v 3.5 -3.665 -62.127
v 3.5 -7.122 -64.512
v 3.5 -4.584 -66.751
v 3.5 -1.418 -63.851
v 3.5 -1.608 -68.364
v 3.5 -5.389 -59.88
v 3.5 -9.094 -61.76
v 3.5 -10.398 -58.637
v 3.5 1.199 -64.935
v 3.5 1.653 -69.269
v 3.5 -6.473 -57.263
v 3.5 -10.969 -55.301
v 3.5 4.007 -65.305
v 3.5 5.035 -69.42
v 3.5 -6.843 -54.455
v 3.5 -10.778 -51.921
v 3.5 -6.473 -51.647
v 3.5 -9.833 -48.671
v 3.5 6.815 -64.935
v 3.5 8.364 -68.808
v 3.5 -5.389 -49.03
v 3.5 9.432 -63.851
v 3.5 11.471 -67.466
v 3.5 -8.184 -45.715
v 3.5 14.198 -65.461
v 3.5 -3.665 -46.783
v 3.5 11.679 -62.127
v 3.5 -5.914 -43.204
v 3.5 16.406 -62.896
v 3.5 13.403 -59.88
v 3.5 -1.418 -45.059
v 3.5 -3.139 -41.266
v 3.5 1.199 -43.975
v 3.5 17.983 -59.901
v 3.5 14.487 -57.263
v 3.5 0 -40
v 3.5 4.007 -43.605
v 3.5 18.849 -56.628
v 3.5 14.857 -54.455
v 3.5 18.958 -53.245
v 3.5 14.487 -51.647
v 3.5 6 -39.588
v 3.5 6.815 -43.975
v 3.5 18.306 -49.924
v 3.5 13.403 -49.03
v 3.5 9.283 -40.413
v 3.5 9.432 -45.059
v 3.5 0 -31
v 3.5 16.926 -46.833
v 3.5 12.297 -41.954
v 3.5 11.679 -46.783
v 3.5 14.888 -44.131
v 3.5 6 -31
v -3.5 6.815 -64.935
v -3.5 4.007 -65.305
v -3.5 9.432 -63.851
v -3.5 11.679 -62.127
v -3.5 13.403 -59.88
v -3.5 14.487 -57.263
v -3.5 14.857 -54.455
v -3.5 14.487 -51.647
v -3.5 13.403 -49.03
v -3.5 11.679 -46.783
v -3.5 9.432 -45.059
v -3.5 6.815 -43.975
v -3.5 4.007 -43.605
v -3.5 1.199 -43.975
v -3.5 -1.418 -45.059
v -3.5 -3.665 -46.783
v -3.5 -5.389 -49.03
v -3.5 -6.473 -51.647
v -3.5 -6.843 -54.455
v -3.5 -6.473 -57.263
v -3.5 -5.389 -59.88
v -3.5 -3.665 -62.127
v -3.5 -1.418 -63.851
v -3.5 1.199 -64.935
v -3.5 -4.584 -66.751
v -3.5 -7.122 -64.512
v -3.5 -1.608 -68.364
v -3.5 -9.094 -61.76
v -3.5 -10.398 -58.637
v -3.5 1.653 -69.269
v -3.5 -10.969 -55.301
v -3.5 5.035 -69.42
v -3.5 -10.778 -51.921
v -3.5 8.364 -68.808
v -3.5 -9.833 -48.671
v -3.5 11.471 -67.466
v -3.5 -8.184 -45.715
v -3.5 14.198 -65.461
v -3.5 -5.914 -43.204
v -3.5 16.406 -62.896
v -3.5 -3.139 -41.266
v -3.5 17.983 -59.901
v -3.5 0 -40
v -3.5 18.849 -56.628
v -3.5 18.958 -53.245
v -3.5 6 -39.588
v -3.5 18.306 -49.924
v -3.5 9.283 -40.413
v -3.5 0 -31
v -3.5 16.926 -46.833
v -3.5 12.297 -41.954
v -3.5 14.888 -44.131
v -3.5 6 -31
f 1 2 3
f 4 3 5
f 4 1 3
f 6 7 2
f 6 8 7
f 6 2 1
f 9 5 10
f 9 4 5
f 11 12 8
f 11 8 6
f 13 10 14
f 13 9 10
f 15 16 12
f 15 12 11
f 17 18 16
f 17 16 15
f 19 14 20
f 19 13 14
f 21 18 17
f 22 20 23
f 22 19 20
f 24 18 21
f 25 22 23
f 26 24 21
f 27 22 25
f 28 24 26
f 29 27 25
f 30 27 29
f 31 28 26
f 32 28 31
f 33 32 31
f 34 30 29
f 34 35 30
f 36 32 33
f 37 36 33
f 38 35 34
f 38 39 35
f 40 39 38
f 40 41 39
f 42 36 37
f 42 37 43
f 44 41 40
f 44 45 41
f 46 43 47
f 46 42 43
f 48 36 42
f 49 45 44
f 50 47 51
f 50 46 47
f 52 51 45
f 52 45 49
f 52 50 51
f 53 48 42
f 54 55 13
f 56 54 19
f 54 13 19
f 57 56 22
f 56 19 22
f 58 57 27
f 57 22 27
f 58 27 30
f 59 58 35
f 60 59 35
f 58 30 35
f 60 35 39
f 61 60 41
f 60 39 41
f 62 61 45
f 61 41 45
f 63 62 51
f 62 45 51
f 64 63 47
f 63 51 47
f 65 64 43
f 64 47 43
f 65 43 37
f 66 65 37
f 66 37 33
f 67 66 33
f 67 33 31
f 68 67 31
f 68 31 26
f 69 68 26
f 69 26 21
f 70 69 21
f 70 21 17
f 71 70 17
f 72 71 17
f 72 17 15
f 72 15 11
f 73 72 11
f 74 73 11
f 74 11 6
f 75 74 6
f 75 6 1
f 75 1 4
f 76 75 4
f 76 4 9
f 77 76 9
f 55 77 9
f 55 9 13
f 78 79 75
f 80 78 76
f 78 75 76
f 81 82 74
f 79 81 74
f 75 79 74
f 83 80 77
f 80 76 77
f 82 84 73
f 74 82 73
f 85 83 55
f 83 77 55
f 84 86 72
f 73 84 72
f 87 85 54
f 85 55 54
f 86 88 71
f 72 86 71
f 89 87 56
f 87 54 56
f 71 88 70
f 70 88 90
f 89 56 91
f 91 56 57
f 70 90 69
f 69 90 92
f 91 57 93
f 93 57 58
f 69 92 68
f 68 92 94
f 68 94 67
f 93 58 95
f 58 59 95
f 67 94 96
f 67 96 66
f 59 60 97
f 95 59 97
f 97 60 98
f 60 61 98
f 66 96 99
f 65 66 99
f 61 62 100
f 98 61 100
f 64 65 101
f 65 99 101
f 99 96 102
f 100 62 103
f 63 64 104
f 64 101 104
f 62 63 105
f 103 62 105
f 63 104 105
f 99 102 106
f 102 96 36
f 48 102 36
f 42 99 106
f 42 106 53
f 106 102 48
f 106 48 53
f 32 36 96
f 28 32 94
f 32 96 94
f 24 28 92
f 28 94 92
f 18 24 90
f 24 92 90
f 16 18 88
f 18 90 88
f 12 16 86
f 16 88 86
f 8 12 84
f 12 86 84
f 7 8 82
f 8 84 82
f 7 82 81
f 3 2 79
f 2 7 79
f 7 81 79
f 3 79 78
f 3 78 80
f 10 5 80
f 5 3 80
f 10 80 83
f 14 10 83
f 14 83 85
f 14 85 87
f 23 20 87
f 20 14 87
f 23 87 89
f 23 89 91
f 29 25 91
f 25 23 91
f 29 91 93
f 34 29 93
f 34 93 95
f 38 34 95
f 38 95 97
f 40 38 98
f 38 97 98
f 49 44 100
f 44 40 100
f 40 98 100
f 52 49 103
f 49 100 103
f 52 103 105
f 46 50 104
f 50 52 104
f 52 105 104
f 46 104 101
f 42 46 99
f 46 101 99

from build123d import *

# Parameters (mm, degrees)
BOSS_EXTRUDE1_DEPTH      = 6
SKETCH2_R                = 5
CUT_EXTRUDE1_DEPTH       = 107
BOSS_EXTRUDE2_DEPTH      = 3.5
BOSS_EXTRUDE2_DEPTH_BACK = 3.5
SKETCH3_R                = 15
SKETCH4_R                = 10.85
CUT_EXTRUDE2_DEPTH       = 19.5
CIRPATTERN1_COUNT        = 3
SKETCH6_R                = 5
BOSS_EXTRUDE3_DEPTH      = 34
CUT_EXTRUDE5_DEPTH       = 103.68939394
CUT_EXTRUDE5_DEPTH_BACK  = 103.68939394
SKETCH12_W               = 81.781179221
SKETCH12_H               = 82.49231991
CUT_EXTRUDE6_DEPTH       = 39.848263365
CUT_EXTRUDE6_DEPTH_BACK  = 39.848263365
SKETCH13_W               = 17.873677222
SKETCH13_H               = 13.388121455
SKETCH13_W_2             = 15.899401816
SKETCH13_H_2             = 11.800117324


with BuildPart() as part:
    # Sketch1 → Boss-Extrude1 (new body)
    with BuildSketch(Plane(origin=(0, 0, 0), x_dir=(1, 0, 0), z_dir=(0, 1, 0))):
        Polygon((-11.547005384, 40), (-40.414518843, -10), (-28.867513459, -30), (28.867513459, -30), (40.414518843, -10), (11.547005384, 40), align=None)
    extrude(amount=BOSS_EXTRUDE1_DEPTH)

    # Sketch2 → Cut-Extrude1 (cut)
    with BuildSketch(Plane(origin=(0, 6, 0), x_dir=(1, 0, 0), z_dir=(0, 1, 0))):
        Circle(SKETCH2_R)
    extrude(amount=-CUT_EXTRUDE1_DEPTH, mode=Mode.SUBTRACT)

    # Sketch3 → Boss-Extrude2 (add, two sides: drawn at the far end of the back side and taken through both)
    with BuildSketch(Plane(origin=(0, 0, 0), x_dir=(0, 0, -1), z_dir=(1, 0, 0)).offset(-BOSS_EXTRUDE2_DEPTH_BACK)):
        with Locations((54.454926612, 4.00688116)):
            Circle(SKETCH3_R)
    extrude(amount=BOSS_EXTRUDE2_DEPTH + BOSS_EXTRUDE2_DEPTH_BACK)

    # Sketch4 → Cut-Extrude2 (cut)
    with BuildSketch(Plane(origin=(3.5, 0, 0), x_dir=(0, 0, -1), z_dir=(1, 0, 0))):
        with Locations((54.454926612, 4.00688116)):
            Circle(SKETCH4_R)
    extrude(amount=-CUT_EXTRUDE2_DEPTH, mode=Mode.SUBTRACT)


with BuildPart() as cirpattern1_1:
    # CirPattern1: pattern copy
    add(part.part.rotate(Axis((0, -101, 0), (0, 1, 0)), 1 * 360 / CIRPATTERN1_COUNT))


with BuildPart() as cirpattern1_2:
    # CirPattern1: pattern copy
    add(part.part.rotate(Axis((0, -101, 0), (0, 1, 0)), 2 * 360 / CIRPATTERN1_COUNT))


with BuildPart() as part_1:
    add(part.part)

    add(cirpattern1_1.part)  # Boss-Extrude3 merges CirPattern1_1

    add(cirpattern1_2.part)  # Boss-Extrude3 merges CirPattern1_2
    # Sketch6 → Boss-Extrude3 (add)
    with BuildSketch(Plane(origin=(0, 6, 0), x_dir=(1, 0, 0), z_dir=(0, 1, 0))):
        Circle(SKETCH6_R)
    extrude(amount=-BOSS_EXTRUDE3_DEPTH)


with BuildPart() as body_2:
    # Sketch8 → Revolve1 (revolve)
    with BuildSketch(Plane(origin=(0, -28, 0), x_dir=(-1, 0, 0), z_dir=(0, -1, 0))):
        with BuildLine():
            Line((0, 10), (0, -10))
            ThreePointArc((0, -10), (10, 0), (0, 10))
        make_face()
    revolve(axis=Axis((0, -28, 0), (0, 0, -1)))


with BuildPart() as cut_extrude5_tool:
    # Sketch12 → Cut-Extrude5 (new, two sides: drawn at the far end of the back side and taken through both)
    with BuildSketch(Plane(origin=(3.5, 0, 0), x_dir=(0, 0, -1), z_dir=(1, 0, 0)).offset(-CUT_EXTRUDE5_DEPTH_BACK)):
        with Locations((-9.89058961, -10.029914937)):
            Rectangle(SKETCH12_W, SKETCH12_H)
    extrude(amount=CUT_EXTRUDE5_DEPTH + CUT_EXTRUDE5_DEPTH_BACK)


with BuildPart() as part_2:
    add(part_1.part)

    # Cut-Extrude5: cut by cut_extrude5_tool
    add(cut_extrude5_tool.part, mode=Mode.SUBTRACT)

    # Sketch13 → Cut-Extrude6 (cut, two sides: drawn at the far end of the back side and taken through both)
    with BuildSketch(Plane(origin=(0, 0, -40), x_dir=(-1, 0, 0), z_dir=(0, 0, -1)).offset(-CUT_EXTRUDE6_DEPTH_BACK)):
        with Locations((12.436838611, -0.694060728)):
            Rectangle(SKETCH13_W, SKETCH13_H)
        with Locations((-11.449700908, 0.099941338)):
            Rectangle(SKETCH13_W_2, SKETCH13_H_2)
    extrude(amount=CUT_EXTRUDE6_DEPTH + CUT_EXTRUDE6_DEPTH_BACK, mode=Mode.SUBTRACT)


with BuildPart() as body_2_1:
    add(body_2.part)

    # Cut-Extrude5: cut by cut_extrude5_tool
    add(cut_extrude5_tool.part, mode=Mode.SUBTRACT)


solid = part_2.part
